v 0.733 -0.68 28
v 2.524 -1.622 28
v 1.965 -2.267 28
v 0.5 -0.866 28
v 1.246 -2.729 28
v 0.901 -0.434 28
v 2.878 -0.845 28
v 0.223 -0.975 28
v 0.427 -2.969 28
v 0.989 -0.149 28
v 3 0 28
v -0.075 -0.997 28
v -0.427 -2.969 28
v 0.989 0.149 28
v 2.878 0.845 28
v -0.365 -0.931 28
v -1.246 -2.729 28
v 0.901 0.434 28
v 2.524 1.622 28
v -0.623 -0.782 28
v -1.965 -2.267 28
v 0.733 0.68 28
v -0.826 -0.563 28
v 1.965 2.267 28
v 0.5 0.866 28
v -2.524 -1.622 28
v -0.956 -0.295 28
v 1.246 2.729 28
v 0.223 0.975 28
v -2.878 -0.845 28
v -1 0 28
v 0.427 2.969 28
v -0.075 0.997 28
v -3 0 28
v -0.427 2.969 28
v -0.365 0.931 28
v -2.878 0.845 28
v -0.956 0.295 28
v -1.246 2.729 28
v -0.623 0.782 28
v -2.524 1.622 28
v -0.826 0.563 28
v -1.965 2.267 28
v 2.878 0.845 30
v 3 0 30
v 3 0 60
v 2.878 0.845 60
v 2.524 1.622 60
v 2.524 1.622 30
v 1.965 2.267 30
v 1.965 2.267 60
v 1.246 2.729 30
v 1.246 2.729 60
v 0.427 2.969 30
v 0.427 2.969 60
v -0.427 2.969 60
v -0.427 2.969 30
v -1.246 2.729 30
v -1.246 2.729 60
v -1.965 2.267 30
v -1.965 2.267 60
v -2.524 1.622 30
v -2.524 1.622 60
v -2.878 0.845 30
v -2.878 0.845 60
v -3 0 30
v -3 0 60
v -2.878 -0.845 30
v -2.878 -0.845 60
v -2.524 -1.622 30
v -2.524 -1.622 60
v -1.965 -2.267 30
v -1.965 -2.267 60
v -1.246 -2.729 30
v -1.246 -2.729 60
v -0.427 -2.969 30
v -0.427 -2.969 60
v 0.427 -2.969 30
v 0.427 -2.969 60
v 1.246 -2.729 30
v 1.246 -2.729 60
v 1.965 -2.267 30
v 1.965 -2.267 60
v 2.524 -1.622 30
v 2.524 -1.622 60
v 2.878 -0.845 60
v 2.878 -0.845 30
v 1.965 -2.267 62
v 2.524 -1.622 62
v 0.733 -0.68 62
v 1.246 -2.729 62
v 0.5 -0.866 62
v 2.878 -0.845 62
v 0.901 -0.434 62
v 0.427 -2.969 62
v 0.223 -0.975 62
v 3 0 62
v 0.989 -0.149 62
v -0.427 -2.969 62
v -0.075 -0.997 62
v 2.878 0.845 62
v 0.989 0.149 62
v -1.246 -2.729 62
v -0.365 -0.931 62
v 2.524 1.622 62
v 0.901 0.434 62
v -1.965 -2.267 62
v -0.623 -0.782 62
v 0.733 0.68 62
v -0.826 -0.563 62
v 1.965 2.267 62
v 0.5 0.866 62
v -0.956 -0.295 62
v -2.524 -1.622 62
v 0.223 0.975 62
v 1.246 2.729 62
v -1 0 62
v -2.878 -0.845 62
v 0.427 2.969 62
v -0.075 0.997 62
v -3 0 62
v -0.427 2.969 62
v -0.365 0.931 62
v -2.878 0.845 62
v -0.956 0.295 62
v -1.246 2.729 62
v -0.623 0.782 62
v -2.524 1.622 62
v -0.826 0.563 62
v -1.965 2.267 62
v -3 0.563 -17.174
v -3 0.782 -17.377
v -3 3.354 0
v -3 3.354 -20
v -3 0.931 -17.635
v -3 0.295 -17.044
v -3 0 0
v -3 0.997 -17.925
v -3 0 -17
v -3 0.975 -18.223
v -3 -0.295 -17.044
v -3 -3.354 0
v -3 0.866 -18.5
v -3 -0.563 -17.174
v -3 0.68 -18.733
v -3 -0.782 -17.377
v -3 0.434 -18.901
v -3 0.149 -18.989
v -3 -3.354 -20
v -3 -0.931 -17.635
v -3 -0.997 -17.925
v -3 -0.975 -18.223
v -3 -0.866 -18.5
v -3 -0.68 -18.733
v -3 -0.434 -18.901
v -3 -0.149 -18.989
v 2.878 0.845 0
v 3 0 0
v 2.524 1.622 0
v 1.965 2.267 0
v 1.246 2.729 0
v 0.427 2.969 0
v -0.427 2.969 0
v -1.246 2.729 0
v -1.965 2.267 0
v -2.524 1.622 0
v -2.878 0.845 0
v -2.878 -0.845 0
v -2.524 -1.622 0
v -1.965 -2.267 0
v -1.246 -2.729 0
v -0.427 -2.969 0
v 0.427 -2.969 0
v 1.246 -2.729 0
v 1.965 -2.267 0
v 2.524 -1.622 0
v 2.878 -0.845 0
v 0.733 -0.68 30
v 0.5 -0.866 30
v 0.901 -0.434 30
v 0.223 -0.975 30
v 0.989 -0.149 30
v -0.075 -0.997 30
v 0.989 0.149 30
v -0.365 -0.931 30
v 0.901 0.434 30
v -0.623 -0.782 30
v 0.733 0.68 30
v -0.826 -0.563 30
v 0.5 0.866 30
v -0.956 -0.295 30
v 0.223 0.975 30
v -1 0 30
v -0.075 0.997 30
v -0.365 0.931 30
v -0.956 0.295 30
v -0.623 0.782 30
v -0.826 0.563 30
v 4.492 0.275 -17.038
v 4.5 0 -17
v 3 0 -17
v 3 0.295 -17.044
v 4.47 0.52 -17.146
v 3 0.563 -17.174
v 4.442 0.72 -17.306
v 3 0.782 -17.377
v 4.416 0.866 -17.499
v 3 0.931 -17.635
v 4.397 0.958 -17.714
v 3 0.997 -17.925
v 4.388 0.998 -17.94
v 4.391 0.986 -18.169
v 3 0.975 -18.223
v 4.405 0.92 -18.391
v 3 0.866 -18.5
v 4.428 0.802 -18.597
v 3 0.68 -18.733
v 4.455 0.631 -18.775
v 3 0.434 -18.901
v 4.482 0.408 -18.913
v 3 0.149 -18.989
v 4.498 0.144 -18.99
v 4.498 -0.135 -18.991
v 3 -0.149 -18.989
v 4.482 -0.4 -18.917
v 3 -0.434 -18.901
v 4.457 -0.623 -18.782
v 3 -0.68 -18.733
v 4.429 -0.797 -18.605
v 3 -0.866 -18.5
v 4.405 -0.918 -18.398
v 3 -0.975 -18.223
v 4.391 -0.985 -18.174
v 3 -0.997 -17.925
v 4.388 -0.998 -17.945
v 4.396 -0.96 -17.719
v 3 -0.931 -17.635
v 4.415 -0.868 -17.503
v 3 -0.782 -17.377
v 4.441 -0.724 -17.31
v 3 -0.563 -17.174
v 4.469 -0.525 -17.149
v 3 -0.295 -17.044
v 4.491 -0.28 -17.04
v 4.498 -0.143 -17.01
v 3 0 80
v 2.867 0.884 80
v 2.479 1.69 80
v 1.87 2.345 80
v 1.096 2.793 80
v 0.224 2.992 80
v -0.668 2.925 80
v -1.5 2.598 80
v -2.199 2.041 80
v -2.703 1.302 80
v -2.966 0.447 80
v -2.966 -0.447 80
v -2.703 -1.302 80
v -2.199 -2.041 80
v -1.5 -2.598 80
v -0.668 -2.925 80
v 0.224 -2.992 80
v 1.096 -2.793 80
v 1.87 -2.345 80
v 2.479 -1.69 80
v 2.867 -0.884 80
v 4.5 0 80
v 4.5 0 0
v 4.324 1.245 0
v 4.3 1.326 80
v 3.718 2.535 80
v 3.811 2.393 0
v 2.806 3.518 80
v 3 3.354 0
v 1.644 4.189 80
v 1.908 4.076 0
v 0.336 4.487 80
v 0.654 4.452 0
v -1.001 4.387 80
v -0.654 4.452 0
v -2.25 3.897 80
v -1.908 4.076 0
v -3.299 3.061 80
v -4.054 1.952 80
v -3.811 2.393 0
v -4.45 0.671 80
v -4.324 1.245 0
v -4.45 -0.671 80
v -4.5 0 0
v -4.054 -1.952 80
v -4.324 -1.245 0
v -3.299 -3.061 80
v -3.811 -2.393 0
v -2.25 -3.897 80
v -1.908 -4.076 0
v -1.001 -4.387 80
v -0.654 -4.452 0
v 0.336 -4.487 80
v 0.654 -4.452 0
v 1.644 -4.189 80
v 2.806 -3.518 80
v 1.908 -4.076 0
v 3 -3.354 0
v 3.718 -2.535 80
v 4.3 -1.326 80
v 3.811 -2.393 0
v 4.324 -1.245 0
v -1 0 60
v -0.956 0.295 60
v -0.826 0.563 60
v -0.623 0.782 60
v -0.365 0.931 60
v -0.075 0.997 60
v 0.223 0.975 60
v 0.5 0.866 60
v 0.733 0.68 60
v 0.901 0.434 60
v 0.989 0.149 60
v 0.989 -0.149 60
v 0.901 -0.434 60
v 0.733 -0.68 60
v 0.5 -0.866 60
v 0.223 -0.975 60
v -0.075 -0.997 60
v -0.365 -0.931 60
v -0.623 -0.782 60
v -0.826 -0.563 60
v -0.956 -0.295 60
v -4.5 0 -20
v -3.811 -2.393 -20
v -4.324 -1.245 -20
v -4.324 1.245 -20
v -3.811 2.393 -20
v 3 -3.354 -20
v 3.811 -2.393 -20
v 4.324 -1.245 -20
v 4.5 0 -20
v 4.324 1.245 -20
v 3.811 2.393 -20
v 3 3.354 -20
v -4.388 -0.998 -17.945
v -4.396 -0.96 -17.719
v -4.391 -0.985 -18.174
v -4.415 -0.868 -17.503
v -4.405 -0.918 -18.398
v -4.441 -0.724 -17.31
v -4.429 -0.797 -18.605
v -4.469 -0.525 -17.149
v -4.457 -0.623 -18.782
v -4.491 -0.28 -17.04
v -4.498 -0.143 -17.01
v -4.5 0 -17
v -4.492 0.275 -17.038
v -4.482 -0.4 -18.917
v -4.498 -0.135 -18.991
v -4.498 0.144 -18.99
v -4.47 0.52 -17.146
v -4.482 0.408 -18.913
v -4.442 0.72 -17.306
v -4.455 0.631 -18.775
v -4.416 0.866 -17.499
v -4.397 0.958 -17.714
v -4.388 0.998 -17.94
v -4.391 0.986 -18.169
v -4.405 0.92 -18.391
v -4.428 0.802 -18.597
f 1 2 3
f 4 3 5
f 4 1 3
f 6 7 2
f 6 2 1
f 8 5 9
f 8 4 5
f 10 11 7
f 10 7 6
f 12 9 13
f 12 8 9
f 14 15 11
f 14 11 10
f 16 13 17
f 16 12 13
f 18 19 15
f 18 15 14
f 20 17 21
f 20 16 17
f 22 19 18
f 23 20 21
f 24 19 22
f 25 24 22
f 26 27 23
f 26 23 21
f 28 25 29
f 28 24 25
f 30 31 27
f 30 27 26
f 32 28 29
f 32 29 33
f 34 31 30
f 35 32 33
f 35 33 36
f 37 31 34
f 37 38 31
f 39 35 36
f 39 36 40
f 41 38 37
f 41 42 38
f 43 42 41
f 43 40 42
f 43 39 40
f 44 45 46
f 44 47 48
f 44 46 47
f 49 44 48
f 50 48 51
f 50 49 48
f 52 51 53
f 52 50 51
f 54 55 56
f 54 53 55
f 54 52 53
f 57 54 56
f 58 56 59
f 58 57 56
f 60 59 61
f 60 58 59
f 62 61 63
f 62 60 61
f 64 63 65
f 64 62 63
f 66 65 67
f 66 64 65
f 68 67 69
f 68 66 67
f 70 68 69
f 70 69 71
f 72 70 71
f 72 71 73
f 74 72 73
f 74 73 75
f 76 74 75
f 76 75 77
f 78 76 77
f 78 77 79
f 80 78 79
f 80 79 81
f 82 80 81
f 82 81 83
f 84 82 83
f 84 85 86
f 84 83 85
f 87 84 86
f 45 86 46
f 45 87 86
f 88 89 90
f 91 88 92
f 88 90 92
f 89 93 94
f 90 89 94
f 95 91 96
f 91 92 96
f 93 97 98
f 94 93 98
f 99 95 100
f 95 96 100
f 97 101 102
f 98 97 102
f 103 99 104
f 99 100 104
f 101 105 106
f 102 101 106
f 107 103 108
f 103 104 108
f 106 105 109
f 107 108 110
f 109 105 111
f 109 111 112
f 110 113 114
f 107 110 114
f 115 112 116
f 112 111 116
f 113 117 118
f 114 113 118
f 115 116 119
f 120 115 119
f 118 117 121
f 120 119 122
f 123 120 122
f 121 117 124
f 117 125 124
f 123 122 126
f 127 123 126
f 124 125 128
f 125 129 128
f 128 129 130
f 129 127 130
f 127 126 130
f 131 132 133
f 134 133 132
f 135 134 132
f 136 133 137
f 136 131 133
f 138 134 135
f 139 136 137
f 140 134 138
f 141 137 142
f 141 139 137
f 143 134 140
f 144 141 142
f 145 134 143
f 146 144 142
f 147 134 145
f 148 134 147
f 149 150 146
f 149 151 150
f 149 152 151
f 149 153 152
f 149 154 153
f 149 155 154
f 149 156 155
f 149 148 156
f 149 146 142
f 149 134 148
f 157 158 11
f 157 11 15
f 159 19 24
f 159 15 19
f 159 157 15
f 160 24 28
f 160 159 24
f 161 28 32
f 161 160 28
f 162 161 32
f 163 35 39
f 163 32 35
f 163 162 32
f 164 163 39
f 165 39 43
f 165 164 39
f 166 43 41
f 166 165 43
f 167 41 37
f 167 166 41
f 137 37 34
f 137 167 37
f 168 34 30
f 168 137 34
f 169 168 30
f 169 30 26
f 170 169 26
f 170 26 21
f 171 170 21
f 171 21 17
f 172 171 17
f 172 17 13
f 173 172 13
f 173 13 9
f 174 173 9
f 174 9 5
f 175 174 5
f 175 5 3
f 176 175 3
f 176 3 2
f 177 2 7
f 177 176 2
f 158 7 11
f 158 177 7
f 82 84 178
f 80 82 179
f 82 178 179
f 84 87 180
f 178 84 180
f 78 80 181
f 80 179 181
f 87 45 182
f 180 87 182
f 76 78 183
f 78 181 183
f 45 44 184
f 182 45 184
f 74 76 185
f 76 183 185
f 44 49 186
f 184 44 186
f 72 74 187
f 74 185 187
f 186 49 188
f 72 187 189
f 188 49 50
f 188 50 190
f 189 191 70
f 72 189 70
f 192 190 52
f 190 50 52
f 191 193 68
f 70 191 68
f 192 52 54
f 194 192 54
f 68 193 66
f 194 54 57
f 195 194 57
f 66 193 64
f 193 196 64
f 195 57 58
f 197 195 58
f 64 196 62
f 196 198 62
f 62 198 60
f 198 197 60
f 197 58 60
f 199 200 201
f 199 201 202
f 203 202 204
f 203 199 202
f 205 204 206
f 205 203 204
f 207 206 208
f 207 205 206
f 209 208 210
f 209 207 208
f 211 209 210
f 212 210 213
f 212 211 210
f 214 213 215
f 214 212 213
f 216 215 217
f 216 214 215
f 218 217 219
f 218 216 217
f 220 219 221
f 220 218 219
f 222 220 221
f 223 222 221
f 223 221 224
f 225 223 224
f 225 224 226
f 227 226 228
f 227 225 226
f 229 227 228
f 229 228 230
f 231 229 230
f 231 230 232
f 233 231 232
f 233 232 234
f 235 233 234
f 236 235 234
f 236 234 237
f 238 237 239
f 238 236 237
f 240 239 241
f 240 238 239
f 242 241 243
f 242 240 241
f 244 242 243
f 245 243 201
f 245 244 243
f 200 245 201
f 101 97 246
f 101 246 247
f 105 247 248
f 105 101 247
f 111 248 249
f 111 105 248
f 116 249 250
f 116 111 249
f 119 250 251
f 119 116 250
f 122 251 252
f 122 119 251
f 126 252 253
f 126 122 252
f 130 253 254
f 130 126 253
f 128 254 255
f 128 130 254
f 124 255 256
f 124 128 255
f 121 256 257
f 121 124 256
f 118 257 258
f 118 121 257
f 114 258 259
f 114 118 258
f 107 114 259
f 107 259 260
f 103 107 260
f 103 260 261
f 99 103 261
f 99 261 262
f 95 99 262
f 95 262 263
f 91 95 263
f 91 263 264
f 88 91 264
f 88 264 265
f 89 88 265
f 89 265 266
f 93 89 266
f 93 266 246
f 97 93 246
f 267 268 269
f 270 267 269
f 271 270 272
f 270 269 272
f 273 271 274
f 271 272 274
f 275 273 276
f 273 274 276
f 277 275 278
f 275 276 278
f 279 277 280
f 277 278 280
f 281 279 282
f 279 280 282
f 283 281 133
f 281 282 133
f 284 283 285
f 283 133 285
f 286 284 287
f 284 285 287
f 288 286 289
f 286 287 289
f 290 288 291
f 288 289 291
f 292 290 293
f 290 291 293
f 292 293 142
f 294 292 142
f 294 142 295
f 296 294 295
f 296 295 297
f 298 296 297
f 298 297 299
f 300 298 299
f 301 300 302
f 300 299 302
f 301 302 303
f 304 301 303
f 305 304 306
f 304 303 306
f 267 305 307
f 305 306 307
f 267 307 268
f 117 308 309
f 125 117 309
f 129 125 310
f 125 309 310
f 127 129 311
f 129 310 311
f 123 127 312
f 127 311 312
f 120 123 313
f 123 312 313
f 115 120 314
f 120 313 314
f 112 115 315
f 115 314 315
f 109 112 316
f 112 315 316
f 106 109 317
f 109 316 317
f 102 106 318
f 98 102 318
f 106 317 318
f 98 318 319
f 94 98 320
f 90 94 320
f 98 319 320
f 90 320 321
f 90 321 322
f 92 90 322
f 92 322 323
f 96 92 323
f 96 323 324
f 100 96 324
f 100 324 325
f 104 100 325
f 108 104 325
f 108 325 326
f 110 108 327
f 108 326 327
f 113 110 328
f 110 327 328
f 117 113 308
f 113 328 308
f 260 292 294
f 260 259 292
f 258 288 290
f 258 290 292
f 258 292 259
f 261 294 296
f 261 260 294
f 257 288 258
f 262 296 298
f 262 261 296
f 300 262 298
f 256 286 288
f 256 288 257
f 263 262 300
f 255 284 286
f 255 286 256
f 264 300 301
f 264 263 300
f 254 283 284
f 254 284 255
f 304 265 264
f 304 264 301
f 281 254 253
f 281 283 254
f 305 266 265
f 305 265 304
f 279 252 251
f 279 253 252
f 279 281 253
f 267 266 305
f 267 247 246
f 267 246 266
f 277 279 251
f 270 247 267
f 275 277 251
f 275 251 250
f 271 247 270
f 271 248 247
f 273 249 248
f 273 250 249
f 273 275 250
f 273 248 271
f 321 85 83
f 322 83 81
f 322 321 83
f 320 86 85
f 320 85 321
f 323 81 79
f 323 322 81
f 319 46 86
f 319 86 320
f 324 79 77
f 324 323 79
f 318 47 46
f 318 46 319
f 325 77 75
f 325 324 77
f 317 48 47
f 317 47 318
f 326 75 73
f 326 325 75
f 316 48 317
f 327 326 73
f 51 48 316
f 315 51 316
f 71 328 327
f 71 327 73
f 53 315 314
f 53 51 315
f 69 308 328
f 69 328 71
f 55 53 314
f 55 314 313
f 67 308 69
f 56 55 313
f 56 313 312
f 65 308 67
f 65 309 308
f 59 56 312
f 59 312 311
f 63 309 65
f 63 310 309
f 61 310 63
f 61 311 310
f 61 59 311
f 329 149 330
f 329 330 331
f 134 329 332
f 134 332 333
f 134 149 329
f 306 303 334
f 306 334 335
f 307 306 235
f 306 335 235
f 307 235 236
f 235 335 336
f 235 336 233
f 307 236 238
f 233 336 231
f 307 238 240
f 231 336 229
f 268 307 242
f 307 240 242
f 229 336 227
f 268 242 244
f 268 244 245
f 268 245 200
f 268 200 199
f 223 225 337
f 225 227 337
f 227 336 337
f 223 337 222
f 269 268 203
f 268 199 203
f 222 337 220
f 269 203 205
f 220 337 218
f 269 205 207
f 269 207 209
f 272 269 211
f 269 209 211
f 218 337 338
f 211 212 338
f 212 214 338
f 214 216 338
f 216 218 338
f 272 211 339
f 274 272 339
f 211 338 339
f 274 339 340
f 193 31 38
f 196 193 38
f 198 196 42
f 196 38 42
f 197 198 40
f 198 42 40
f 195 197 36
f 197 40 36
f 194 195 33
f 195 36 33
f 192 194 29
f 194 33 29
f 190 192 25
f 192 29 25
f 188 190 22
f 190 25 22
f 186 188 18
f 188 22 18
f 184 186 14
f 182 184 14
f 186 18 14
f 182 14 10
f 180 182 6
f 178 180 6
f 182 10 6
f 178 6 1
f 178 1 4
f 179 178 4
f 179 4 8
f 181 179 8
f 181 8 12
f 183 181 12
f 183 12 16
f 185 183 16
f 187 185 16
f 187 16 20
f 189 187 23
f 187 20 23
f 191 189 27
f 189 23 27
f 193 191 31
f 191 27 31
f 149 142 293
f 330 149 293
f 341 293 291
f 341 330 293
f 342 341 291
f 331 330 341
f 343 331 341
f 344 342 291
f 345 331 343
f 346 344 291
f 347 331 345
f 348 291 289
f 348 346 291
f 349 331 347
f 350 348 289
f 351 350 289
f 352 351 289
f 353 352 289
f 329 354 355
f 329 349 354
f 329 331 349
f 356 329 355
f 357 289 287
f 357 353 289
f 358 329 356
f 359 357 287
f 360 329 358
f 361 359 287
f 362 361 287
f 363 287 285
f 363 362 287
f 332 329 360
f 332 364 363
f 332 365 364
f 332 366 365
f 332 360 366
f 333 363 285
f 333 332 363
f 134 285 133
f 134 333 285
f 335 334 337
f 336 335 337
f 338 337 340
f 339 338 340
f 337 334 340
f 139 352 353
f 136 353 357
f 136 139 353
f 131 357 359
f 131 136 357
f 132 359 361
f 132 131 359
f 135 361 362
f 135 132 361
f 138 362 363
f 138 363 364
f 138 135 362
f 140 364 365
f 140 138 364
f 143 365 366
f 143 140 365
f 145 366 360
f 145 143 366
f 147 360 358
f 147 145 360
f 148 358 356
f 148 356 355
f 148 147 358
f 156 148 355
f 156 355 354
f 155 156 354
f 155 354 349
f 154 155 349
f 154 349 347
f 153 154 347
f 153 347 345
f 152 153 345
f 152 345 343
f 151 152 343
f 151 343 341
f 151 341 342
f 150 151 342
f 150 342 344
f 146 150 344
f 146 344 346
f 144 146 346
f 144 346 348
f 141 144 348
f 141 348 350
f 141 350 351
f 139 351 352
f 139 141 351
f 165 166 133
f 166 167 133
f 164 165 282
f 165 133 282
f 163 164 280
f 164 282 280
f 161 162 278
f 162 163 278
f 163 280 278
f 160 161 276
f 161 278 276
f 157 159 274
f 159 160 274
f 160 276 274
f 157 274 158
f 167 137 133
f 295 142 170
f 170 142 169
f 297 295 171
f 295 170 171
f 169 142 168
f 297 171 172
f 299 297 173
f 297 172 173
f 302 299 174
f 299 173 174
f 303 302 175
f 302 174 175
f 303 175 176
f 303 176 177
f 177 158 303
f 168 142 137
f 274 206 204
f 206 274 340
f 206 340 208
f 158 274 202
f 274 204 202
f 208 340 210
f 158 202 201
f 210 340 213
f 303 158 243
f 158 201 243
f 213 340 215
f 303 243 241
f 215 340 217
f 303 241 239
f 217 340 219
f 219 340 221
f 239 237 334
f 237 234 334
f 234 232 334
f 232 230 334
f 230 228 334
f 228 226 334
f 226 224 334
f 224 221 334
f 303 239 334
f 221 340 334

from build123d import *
from build123d.topology import SkipClean

# Parameters (mm, degrees)
SKETCH2_R               = 4.5
SKETCH2_R_2             = 3
BOSS_EXTRUDE1_DEPTH     = 80
BOSS_EXTRUDE2_START     = 20
BOSS_EXTRUDE2_DEPTH     = 20
CUT_EXTRUDE1_DEPTH      = 81.476704704
CUT_EXTRUDE1_DEPTH_BACK = 81.476704704
SKETCH4_R               = 1
BOSS_EXTRUDE3_START     = 2
SKETCH7_R               = 3
SKETCH7_R_2             = 1
BOSS_EXTRUDE3_DEPTH     = 2
SKETCH10_R              = 3
SKETCH10_R_2            = 1
BOSS_EXTRUDE4_DEPTH     = 2


with BuildPart() as part:
    # Sketch2 → Boss-Extrude1 (new body)
    with BuildSketch(Plane.XY):
        Circle(SKETCH2_R)
        Circle(SKETCH2_R_2, mode=Mode.SUBTRACT)
    extrude(amount=BOSS_EXTRUDE1_DEPTH)

    # Sketch3 → Boss-Extrude2 (add)
    with SkipClean():  # the faces are left unmerged after this step: merging them gives an invalid solid
        with BuildSketch(Plane(origin=(0, 0, 0), x_dir=(-1, 0, 0), z_dir=(0, 0, -1)).offset(BOSS_EXTRUDE2_START)):
            with BuildLine():
                Line((3, 3.354101966), (3, -3.354101966))
                ThreePointArc((3, -3.354101966), (4.5, 0), (3, 3.354101966))
            make_face()
            with BuildLine():
                Line((-3, 3.354101966), (-3, -3.354101966))
                ThreePointArc((-3, -3.354101966), (-4.5, 0), (-3, 3.354101966))
            make_face()
        extrude(amount=-BOSS_EXTRUDE2_DEPTH)

    # Sketch4 → Cut-Extrude1 (cut, two sides: drawn at the far end of the back side and taken through both)
    with SkipClean():  # the faces are left unmerged after this step: merging them gives an invalid solid
        with BuildSketch(Plane.ZY.offset(-3).offset(-CUT_EXTRUDE1_DEPTH_BACK)):
            with Locations((-18, 0)):
                Circle(SKETCH4_R)
        extrude(amount=CUT_EXTRUDE1_DEPTH + CUT_EXTRUDE1_DEPTH_BACK, mode=Mode.SUBTRACT)

    # Sketch7 → Boss-Extrude3 (add)
    with SkipClean():  # the faces are left unmerged after this step: merging them gives an invalid solid
        with BuildSketch(Plane(origin=(0, 0, 30), x_dir=(-1, 0, 0), z_dir=(0, 0, -1)).offset(BOSS_EXTRUDE3_START)):
            Circle(SKETCH7_R)
            Circle(SKETCH7_R_2, mode=Mode.SUBTRACT)
        extrude(amount=-BOSS_EXTRUDE3_DEPTH)

    # Sketch10 → Boss-Extrude4 (add)
    with SkipClean():  # the faces are left unmerged after this step: merging them gives an invalid solid
        with BuildSketch(Plane(origin=(0, 0, 60), x_dir=(-1, 0, 0), z_dir=(0, 0, -1))):
            Circle(SKETCH10_R)
            Circle(SKETCH10_R_2, mode=Mode.SUBTRACT)
        extrude(amount=-BOSS_EXTRUDE4_DEPTH)


solid = part.part
